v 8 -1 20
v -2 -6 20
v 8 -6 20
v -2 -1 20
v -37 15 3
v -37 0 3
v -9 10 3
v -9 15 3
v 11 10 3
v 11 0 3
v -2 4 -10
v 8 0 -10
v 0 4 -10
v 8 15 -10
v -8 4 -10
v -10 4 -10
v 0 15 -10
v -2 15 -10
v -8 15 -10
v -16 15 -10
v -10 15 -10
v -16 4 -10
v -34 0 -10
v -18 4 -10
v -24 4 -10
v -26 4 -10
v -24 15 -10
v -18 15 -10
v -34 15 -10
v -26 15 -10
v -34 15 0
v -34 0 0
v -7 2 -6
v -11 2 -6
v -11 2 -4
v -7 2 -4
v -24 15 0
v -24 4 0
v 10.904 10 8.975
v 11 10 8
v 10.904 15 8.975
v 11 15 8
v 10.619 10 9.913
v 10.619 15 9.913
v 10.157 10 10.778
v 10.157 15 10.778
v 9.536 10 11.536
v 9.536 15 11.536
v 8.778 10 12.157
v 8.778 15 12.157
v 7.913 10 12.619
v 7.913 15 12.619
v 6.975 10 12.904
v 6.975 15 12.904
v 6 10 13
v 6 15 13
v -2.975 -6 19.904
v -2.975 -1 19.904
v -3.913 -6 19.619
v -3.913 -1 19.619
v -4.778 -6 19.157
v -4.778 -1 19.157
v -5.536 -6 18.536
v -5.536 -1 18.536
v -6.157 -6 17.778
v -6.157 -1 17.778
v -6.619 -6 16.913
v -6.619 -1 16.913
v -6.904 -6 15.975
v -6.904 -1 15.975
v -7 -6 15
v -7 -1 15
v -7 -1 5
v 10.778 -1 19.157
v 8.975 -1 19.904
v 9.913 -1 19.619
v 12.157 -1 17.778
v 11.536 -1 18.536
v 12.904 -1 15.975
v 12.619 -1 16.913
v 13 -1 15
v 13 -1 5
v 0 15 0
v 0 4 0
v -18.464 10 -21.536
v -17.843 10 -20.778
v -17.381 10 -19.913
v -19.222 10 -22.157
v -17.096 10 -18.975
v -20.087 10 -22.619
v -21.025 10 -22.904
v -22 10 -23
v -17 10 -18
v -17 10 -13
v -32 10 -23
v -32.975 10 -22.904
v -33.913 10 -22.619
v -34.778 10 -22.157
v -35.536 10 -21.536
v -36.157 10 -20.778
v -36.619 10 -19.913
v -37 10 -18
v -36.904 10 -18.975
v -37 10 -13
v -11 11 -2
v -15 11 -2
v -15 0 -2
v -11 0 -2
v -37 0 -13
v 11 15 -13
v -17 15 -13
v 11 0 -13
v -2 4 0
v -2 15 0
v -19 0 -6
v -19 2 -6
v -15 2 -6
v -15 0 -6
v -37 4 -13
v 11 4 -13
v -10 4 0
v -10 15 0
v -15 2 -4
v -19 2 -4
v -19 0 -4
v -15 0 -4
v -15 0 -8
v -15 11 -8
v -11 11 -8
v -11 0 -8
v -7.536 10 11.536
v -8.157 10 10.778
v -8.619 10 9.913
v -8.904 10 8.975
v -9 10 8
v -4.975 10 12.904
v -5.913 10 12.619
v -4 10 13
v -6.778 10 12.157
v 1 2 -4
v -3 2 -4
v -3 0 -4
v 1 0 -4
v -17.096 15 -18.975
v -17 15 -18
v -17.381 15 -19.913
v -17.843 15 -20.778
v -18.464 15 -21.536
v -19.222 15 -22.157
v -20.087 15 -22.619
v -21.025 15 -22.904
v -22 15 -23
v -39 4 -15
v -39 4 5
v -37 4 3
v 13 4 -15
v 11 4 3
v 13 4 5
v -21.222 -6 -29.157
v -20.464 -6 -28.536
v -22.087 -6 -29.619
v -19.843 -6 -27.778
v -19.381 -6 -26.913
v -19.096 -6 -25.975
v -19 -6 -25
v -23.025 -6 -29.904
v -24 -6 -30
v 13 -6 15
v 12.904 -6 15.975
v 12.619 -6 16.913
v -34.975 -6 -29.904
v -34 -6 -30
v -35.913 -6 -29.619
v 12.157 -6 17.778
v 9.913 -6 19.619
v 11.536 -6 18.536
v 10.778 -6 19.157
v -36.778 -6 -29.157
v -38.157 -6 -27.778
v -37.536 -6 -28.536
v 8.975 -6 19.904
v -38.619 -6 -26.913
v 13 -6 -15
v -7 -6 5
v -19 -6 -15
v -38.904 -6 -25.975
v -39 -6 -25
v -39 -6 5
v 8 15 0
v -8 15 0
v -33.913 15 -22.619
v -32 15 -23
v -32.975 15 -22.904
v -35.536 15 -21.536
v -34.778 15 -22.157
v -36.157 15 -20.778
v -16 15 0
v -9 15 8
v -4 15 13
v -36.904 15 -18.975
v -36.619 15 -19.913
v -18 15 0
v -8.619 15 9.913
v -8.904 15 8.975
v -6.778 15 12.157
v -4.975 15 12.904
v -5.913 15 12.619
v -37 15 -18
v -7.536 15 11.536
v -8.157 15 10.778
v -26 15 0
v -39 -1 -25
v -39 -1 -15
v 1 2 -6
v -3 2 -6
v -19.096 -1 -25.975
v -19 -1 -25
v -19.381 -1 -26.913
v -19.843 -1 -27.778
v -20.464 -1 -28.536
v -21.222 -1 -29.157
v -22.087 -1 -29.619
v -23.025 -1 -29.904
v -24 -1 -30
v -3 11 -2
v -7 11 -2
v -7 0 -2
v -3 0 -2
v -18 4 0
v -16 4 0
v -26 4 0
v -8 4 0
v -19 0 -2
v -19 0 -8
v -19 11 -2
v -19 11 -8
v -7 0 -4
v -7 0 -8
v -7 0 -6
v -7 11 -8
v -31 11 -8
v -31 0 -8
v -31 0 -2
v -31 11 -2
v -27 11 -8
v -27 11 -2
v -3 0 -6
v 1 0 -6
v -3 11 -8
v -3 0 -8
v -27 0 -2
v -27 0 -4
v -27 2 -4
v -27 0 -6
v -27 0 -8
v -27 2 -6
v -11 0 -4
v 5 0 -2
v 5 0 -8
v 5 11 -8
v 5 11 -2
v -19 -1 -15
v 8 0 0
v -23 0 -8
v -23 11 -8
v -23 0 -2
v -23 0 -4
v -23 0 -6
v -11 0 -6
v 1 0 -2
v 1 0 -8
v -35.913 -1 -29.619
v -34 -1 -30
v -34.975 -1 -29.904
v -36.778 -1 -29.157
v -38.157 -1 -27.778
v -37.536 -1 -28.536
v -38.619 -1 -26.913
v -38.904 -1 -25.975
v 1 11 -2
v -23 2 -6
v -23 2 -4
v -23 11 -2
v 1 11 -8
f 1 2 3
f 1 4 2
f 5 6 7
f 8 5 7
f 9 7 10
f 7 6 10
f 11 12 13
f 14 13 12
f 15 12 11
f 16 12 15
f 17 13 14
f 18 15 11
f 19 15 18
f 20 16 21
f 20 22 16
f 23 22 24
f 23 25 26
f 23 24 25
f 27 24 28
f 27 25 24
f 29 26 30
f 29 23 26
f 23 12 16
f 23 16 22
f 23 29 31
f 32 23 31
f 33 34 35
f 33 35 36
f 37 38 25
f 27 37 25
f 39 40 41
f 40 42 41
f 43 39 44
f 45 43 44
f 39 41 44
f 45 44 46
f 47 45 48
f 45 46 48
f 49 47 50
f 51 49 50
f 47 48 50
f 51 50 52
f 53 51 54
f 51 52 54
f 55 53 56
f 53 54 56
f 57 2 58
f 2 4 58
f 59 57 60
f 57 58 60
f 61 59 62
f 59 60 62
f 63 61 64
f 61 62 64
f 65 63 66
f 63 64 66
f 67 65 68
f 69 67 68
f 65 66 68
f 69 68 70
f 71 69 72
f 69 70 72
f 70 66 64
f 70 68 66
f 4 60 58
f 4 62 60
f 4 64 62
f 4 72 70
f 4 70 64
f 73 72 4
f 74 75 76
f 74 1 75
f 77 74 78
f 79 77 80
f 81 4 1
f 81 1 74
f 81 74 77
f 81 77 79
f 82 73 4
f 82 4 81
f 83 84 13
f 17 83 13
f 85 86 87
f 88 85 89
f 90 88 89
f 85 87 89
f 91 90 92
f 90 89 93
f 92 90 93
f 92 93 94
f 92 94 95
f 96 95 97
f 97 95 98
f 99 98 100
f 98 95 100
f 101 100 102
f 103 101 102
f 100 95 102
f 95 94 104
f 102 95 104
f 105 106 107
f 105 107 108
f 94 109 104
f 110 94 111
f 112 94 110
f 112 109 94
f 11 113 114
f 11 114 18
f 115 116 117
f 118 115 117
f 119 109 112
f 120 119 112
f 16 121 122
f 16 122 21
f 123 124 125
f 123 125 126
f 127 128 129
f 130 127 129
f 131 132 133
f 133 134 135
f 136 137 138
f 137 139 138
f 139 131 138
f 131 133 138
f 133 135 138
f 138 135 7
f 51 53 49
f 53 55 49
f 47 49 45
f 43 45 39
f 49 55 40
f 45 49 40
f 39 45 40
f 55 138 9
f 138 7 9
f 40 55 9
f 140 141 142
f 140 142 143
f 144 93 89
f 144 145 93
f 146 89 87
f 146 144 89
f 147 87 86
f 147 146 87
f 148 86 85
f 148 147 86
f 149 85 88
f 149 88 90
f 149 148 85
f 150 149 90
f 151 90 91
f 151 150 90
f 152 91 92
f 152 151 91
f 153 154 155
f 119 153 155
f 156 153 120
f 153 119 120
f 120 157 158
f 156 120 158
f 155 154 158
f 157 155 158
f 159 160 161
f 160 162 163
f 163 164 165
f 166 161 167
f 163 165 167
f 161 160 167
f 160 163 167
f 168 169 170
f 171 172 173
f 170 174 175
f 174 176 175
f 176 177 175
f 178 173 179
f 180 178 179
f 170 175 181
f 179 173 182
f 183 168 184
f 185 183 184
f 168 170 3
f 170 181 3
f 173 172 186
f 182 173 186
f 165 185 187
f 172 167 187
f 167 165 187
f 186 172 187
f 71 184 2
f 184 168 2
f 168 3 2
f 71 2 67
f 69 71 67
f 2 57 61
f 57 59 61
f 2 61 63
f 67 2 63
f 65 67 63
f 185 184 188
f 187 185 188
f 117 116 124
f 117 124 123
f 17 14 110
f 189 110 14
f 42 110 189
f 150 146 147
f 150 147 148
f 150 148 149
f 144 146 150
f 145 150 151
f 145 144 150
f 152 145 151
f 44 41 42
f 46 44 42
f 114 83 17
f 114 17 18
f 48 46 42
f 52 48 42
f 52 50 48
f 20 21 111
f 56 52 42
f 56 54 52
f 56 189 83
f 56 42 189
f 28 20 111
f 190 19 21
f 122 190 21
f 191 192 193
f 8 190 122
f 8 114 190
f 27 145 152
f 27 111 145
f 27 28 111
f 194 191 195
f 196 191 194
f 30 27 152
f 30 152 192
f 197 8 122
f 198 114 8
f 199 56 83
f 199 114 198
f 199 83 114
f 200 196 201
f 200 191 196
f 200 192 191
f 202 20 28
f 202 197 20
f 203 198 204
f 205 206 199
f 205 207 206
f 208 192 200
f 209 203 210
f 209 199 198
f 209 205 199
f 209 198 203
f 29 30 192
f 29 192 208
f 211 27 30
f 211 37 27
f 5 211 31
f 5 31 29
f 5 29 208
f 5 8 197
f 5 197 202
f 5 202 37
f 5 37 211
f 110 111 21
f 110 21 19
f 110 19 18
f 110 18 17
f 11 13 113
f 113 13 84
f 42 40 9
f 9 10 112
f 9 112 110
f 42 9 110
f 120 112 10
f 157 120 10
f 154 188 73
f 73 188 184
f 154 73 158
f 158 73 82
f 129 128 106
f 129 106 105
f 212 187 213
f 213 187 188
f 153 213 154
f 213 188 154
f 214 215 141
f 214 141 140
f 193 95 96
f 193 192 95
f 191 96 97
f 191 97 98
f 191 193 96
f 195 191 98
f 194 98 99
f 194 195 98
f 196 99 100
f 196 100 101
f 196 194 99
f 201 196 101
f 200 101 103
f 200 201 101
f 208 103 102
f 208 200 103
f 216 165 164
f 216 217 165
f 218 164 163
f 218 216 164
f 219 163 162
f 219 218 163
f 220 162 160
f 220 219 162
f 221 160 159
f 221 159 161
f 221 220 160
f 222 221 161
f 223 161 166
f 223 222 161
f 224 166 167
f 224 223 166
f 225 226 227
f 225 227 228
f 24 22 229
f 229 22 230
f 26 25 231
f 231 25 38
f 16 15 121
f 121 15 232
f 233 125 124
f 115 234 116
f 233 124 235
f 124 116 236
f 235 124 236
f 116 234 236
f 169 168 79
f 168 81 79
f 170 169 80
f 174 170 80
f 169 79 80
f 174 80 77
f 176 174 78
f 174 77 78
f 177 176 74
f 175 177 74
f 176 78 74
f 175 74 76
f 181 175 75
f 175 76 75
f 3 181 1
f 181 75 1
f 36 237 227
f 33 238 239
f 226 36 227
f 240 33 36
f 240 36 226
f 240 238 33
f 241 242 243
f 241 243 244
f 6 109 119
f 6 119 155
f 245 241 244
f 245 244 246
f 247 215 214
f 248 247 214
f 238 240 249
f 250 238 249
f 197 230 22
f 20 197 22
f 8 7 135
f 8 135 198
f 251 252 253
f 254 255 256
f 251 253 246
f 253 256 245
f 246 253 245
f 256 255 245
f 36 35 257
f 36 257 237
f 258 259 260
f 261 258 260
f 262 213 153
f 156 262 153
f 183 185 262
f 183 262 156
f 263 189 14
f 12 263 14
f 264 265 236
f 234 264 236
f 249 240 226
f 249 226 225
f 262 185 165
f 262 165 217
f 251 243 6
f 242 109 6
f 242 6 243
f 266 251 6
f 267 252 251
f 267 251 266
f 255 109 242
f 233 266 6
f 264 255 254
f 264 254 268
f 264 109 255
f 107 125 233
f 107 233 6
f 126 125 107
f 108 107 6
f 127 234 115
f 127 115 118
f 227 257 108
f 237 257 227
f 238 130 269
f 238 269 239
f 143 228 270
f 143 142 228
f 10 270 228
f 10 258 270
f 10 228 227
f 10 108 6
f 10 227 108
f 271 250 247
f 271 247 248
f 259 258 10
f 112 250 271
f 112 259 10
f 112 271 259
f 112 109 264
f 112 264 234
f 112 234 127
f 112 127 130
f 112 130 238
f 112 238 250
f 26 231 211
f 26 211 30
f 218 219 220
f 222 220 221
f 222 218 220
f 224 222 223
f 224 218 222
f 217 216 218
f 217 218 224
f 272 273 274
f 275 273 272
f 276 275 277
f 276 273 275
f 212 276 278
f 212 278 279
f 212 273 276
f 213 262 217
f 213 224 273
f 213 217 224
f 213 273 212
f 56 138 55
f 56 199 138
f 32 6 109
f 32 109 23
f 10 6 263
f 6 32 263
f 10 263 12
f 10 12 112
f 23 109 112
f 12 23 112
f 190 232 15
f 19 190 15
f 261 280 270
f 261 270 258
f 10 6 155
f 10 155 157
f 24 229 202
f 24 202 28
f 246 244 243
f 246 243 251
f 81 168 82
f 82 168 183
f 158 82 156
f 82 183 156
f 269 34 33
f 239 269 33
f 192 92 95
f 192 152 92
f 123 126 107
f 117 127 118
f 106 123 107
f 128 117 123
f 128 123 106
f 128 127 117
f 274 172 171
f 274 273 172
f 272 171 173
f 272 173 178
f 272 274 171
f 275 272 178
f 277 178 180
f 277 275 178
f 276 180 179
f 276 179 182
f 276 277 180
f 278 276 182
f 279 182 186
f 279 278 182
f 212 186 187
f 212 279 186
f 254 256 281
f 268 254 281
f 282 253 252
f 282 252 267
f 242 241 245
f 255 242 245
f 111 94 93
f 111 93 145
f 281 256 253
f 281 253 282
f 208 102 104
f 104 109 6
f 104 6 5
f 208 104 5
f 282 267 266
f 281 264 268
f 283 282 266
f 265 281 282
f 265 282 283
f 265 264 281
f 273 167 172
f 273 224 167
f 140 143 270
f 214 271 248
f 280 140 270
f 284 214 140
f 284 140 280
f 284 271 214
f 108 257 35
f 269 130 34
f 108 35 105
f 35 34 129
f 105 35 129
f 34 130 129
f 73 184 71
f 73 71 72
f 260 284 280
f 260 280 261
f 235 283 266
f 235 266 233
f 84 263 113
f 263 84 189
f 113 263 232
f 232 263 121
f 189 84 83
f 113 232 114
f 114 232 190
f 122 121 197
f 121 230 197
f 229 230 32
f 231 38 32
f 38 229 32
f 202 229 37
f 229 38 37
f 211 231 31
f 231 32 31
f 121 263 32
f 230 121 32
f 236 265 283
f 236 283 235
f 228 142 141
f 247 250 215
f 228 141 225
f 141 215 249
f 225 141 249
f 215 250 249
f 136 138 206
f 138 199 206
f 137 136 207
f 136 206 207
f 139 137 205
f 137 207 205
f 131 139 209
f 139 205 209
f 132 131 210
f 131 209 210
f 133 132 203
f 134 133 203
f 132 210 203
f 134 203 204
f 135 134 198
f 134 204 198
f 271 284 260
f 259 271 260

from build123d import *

# Parameters (mm, degrees)
SKETCH1_W                = 6
SKETCH1_H                = 10
BOSS_EXTRUDE1_DEPTH      = 15
SKETCH2_W                = 4
SKETCH2_H                = 6
CUT_EXTRUDE1_DEPTH       = 11
SKETCH3_W                = 10
SKETCH3_H                = 4
BOSS_EXTRUDE2_DEPTH      = 2
LPATTERN1_COUNT          = 5
LPATTERN1_PITCH          = 8
SKETCH4_W                = 10
SKETCH4_H                = 11
BOSS_EXTRUDE3_DEPTH      = 2
SKETCH5_W                = 10
SKETCH5_H                = 15
BOSS_EXTRUDE4_DEPTH      = 2
SKETCH6_W                = 36
SKETCH6_H                = 2
CUT_EXTRUDE2_DEPTH       = 2
BOSS_EXTRUDE7_DEPTH      = 15
BOSS_EXTRUDE7_DEPTH_BACK = 6
SKETCH9_W                = 48
SKETCH9_H                = 16
SPLIT1_START             = -6
SPLIT1_OUTLINE_W         = 48
SPLIT1_OUTLINE_H         = 16
SPLIT1_DEPTH             = 6
SPLIT1_2_OUTLINE_W       = 4
SPLIT1_2_OUTLINE_H       = 6
SPLIT1_2_DEPTH           = 11
SPLIT1_3_OUTLINE_W       = 4
SPLIT1_3_OUTLINE_H       = 2
SPLIT1_3_DEPTH           = 2
SPLIT1_START_2           = -13
SPLIT1_4_OUTLINE_W       = 48
SPLIT1_4_OUTLINE_H       = 6
SPLIT1_4_DEPTH           = 16
SPLIT1_START_3           = -8
SPLIT1_5_OUTLINE_W       = 4
SPLIT1_5_OUTLINE_H       = 11
SPLIT1_5_DEPTH           = 6
SPLIT1_6_OUTLINE_W       = 4
SPLIT1_6_OUTLINE_H       = 2
SPLIT1_6_DEPTH           = 2
SKETCH11_W               = 20
SKETCH11_H               = 5
BOSS_EXTRUDE8_DEPTH      = 10
SKETCH12_W               = 20
SKETCH12_H               = 5
BOSS_EXTRUDE9_DEPTH      = 10
FILLET1_R                = 5
SKETCH13_W               = 52
SKETCH13_H               = 20
SKETCH13_W_2             = 48
SKETCH13_H_2             = 16
BOSS_EXTRUDE11_DEPTH     = 10
SKETCH14_W               = 20
SKETCH14_H               = 5
BOSS_EXTRUDE12_DEPTH     = 15
SKETCH15_W               = 20
SKETCH15_H               = 5
BOSS_EXTRUDE13_DEPTH     = 15
FILLET2_R                = 5


# Read off the part's stored shape, not the designer's step: Split1
with BuildPart() as part:
    # Sketch1 → Boss-Extrude1 (new body)
    with BuildSketch(Plane(origin=(0, 0, 0), x_dir=(1, 0, 0), z_dir=(0, 1, 0))):
        with Locations((3, 5)):
            Rectangle(SKETCH1_W, SKETCH1_H)
    extrude(amount=BOSS_EXTRUDE1_DEPTH)

    # Sketch2 → Cut-Extrude1 (cut)
    with BuildSketch(Plane.XZ):
        with Locations((3, -5)):
            Rectangle(SKETCH2_W, SKETCH2_H)
    extrude(amount=-CUT_EXTRUDE1_DEPTH, mode=Mode.SUBTRACT)

    # Sketch3 → Boss-Extrude2 (add)
    with BuildSketch(Plane.ZY):
        with Locations((-5, 2)):
            Rectangle(SKETCH3_W, SKETCH3_H)
    extrude(amount=BOSS_EXTRUDE2_DEPTH)


with BuildPart() as lpattern1_1:
    # LPattern1: pattern copy
    add(part.part.moved(Location(Vector(-1, 0, 0) * (1 * LPATTERN1_PITCH))))


with BuildPart() as lpattern1_2:
    # LPattern1: pattern copy
    add(part.part.moved(Location(Vector(-1, 0, 0) * (2 * LPATTERN1_PITCH))))


with BuildPart() as lpattern1_3:
    # LPattern1: pattern copy
    add(part.part.moved(Location(Vector(-1, 0, 0) * (3 * LPATTERN1_PITCH))))


with BuildPart() as lpattern1_4:
    # LPattern1: pattern copy
    add(part.part.moved(Location(Vector(-1, 0, 0) * (4 * LPATTERN1_PITCH))))


with BuildPart() as lpattern1_2_1:
    add(lpattern1_2.part)

    # Combine1: union LPattern1_1, part, LPattern1_3, LPattern1_4
    add(lpattern1_1.part)
    add(part.part)
    add(lpattern1_3.part)
    add(lpattern1_4.part)

    # Sketch4 → Boss-Extrude3 (add)
    with BuildSketch(Plane.ZY.offset(32)):
        with Locations((-5, 9.5)):
            Rectangle(SKETCH4_W, SKETCH4_H)
    extrude(amount=BOSS_EXTRUDE3_DEPTH)

    # Sketch5 → Boss-Extrude4 (add)
    with BuildSketch(Plane(origin=(6, 0, 0), x_dir=(0, 0, -1), z_dir=(1, 0, 0))):
        with Locations((5, 7.5)):
            Rectangle(SKETCH5_W, SKETCH5_H)
    extrude(amount=BOSS_EXTRUDE4_DEPTH)

    # Sketch6 → Cut-Extrude2 (cut)
    with BuildSketch(Plane(origin=(0, 0, 0), x_dir=(-1, 0, 0), z_dir=(0, -1, 0))):
        with Locations((13, 5)):
            Rectangle(SKETCH6_W, SKETCH6_H)
    extrude(amount=-CUT_EXTRUDE2_DEPTH, mode=Mode.SUBTRACT)


with BuildPart() as body_2:
    # Sketch9 → Boss-Extrude7 (new, two sides: drawn at the far end of the back side and taken through both)
    with BuildSketch(Plane(origin=(0, 0, 0), x_dir=(1, 0, 0), z_dir=(0, 1, 0)).offset(-BOSS_EXTRUDE7_DEPTH_BACK)):
        with Locations((-13, 5)):
            Rectangle(SKETCH9_W, SKETCH9_H)
    extrude(amount=BOSS_EXTRUDE7_DEPTH + BOSS_EXTRUDE7_DEPTH_BACK)

    # Combine2: cut LPattern1_2
    add(lpattern1_2_1.part, mode=Mode.SUBTRACT)

    # Split1 outline → Split1 (cut)
    with BuildSketch(Plane(origin=(0, 0, 0), x_dir=(1, 0, 0), z_dir=(0, 1, 0)).offset(SPLIT1_START)):
        with Locations((-13, 5)):
            Rectangle(SPLIT1_OUTLINE_W, SPLIT1_OUTLINE_H)
    extrude(amount=SPLIT1_DEPTH, mode=Mode.SUBTRACT)

    # Split1 2 outline → Split1 2 (cut)
    with BuildSketch(Plane(origin=(0, 0, 0), x_dir=(1, 0, 0), z_dir=(0, 1, 0))):
        with Locations((-13, 5)):
            Rectangle(SPLIT1_2_OUTLINE_W, SPLIT1_2_OUTLINE_H)
        with Locations((-5, 5)):
            Rectangle(SPLIT1_2_OUTLINE_W, SPLIT1_2_OUTLINE_H)
        with Locations((-21, 5)):
            Rectangle(SPLIT1_2_OUTLINE_W, SPLIT1_2_OUTLINE_H)
        with Locations((3, 5)):
            Rectangle(SPLIT1_2_OUTLINE_W, SPLIT1_2_OUTLINE_H)
        with Locations((-29, 5)):
            Rectangle(SPLIT1_2_OUTLINE_W, SPLIT1_2_OUTLINE_H)
    extrude(amount=SPLIT1_2_DEPTH, mode=Mode.SUBTRACT)

    # Split1 3 outline → Split1 3 (cut)
    with BuildSketch(Plane(origin=(0, 0, 0), x_dir=(1, 0, 0), z_dir=(0, 1, 0))):
        with Locations((-9, 5)):
            Rectangle(SPLIT1_3_OUTLINE_W, SPLIT1_3_OUTLINE_H)
        with Locations((-17, 5)):
            Rectangle(SPLIT1_3_OUTLINE_W, SPLIT1_3_OUTLINE_H)
        with Locations((-1, 5)):
            Rectangle(SPLIT1_3_OUTLINE_W, SPLIT1_3_OUTLINE_H)
        with Locations((-25, 5)):
            Rectangle(SPLIT1_3_OUTLINE_W, SPLIT1_3_OUTLINE_H)
    extrude(amount=SPLIT1_3_DEPTH, mode=Mode.SUBTRACT)

    # Sketch11 → Boss-Extrude8 (add)
    with BuildSketch(Plane.XY.offset(3)):
        with Locations((1, 12.5)):
            Rectangle(SKETCH11_W, SKETCH11_H)
    extrude(amount=BOSS_EXTRUDE8_DEPTH)

    # Sketch12 → Boss-Extrude9 (add)
    with BuildSketch(Plane(origin=(0, 0, -13), x_dir=(-1, 0, 0), z_dir=(0, 0, -1))):
        with Locations((27, 12.5)):
            Rectangle(SKETCH12_W, SKETCH12_H)
    extrude(amount=BOSS_EXTRUDE9_DEPTH)

    # Fillet1
    fillet1_edges = [body_2.edges().sort_by_distance(p)[0] for p in [
        (11, 12.5, 13),
        (-9, 12.5, 13),
        (-37, 12.5, -23),
        (-17, 12.5, -23),
    ]]
    fillet(fillet1_edges, radius=FILLET1_R)


with BuildPart() as body_2_2:
    # Split1 4 outline → Split1 4 (new body)
    with BuildSketch(Plane.XY.offset(SPLIT1_START_2)):
        with Locations((-13, -3)):
            Rectangle(SPLIT1_4_OUTLINE_W, SPLIT1_4_OUTLINE_H)
    extrude(amount=SPLIT1_4_DEPTH)

    # Split1 5 outline → Split1 5 (add)
    with BuildSketch(Plane.XY.offset(SPLIT1_START_3)):
        with Locations((-29, 5.5)):
            Rectangle(SPLIT1_5_OUTLINE_W, SPLIT1_5_OUTLINE_H)
        with Locations((-21, 5.5)):
            Rectangle(SPLIT1_5_OUTLINE_W, SPLIT1_5_OUTLINE_H)
        with Locations((-13, 5.5)):
            Rectangle(SPLIT1_5_OUTLINE_W, SPLIT1_5_OUTLINE_H)
        with Locations((3, 5.5)):
            Rectangle(SPLIT1_5_OUTLINE_W, SPLIT1_5_OUTLINE_H)
        with Locations((-5, 5.5)):
            Rectangle(SPLIT1_5_OUTLINE_W, SPLIT1_5_OUTLINE_H)
    extrude(amount=SPLIT1_5_DEPTH)

    # Split1 6 outline → Split1 6 (add)
    with BuildSketch(Plane.XY.offset(SPLIT1_START)):
        with Locations((-25, 1)):
            Rectangle(SPLIT1_6_OUTLINE_W, SPLIT1_6_OUTLINE_H)
        with Locations((-17, 1)):
            Rectangle(SPLIT1_6_OUTLINE_W, SPLIT1_6_OUTLINE_H)
        with Locations((-9, 1)):
            Rectangle(SPLIT1_6_OUTLINE_W, SPLIT1_6_OUTLINE_H)
        with Locations((-1, 1)):
            Rectangle(SPLIT1_6_OUTLINE_W, SPLIT1_6_OUTLINE_H)
    extrude(amount=SPLIT1_6_DEPTH)

    # Sketch13 → Boss-Extrude11 (add)
    with BuildSketch(Plane.XZ.offset(6)):
        with Locations((-13, -5)):
            Rectangle(SKETCH13_W, SKETCH13_H)
        with Locations((-13, -5)):
            Rectangle(SKETCH13_W_2, SKETCH13_H_2, mode=Mode.SUBTRACT)
    extrude(amount=-BOSS_EXTRUDE11_DEPTH)

    # Sketch14 → Boss-Extrude12 (add)
    with BuildSketch(Plane.XY.offset(5)):
        with Locations((3, -3.5)):
            Rectangle(SKETCH14_W, SKETCH14_H)
    extrude(amount=BOSS_EXTRUDE12_DEPTH)

    # Sketch15 → Boss-Extrude13 (add)
    with BuildSketch(Plane(origin=(0, 0, -15), x_dir=(-1, 0, 0), z_dir=(0, 0, -1))):
        with Locations((29, -3.5)):
            Rectangle(SKETCH15_W, SKETCH15_H)
    extrude(amount=BOSS_EXTRUDE13_DEPTH)

    # Fillet2
    fillet2_edges = [body_2_2.edges().sort_by_distance(p)[0] for p in [
        (13, -3.5, 20),
        (-7, -3.5, 20),
        (-39, -3.5, -30),
        (-19, -3.5, -30),
    ]]
    fillet(fillet2_edges, radius=FILLET2_R)


solid = Compound([body_2.part, body_2_2.part])
